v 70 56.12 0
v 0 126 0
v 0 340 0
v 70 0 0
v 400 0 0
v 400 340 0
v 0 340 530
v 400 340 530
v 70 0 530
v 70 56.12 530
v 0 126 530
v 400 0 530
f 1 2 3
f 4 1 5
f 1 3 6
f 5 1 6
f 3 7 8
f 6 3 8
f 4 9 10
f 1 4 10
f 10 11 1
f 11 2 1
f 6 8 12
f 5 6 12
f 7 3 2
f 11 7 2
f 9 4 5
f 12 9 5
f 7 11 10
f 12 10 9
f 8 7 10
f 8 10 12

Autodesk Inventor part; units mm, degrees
ref_plane "YZ Plane" through (0, 0, 0) normal (1, 0, 0) x (0, 1, 0)
ref_plane "XZ Plane" through (0, 0, 0) normal (0, 1, 0) x (-1, 0, 0)
ref_plane "XY Plane" through (0, 0, 0) normal (0, 0, 1) x (1, 0, 0)
sketch "Boceto1" plane through (0, 0, 0) normal (0, 0, 1) x (1, 0, 0)
  line L0 (0, 340) -> (400, 340)
  line L1 (400, 340) -> (400, 0)
  line L2 (70, 0) -> (70, 56.12)
  line L3 (0, 340) -> (0, 126)
  line L4 (0, 126) -> (70, 56.12)
  line L5 (0, 126) -> (0, 340)
  line L6 (70, 0) -> (400, 0)
  point P0 (0, 0)
  dimension "d0" = 340
  dimension "d1" = 400
  dimension "d2" = 70
  dimension "d3" = 56.12
  dimension "d4" = 214
extrude "Extrusión1" add sketch "Boceto1" along normal blind 530
properties part number "caja area de trabajo"
